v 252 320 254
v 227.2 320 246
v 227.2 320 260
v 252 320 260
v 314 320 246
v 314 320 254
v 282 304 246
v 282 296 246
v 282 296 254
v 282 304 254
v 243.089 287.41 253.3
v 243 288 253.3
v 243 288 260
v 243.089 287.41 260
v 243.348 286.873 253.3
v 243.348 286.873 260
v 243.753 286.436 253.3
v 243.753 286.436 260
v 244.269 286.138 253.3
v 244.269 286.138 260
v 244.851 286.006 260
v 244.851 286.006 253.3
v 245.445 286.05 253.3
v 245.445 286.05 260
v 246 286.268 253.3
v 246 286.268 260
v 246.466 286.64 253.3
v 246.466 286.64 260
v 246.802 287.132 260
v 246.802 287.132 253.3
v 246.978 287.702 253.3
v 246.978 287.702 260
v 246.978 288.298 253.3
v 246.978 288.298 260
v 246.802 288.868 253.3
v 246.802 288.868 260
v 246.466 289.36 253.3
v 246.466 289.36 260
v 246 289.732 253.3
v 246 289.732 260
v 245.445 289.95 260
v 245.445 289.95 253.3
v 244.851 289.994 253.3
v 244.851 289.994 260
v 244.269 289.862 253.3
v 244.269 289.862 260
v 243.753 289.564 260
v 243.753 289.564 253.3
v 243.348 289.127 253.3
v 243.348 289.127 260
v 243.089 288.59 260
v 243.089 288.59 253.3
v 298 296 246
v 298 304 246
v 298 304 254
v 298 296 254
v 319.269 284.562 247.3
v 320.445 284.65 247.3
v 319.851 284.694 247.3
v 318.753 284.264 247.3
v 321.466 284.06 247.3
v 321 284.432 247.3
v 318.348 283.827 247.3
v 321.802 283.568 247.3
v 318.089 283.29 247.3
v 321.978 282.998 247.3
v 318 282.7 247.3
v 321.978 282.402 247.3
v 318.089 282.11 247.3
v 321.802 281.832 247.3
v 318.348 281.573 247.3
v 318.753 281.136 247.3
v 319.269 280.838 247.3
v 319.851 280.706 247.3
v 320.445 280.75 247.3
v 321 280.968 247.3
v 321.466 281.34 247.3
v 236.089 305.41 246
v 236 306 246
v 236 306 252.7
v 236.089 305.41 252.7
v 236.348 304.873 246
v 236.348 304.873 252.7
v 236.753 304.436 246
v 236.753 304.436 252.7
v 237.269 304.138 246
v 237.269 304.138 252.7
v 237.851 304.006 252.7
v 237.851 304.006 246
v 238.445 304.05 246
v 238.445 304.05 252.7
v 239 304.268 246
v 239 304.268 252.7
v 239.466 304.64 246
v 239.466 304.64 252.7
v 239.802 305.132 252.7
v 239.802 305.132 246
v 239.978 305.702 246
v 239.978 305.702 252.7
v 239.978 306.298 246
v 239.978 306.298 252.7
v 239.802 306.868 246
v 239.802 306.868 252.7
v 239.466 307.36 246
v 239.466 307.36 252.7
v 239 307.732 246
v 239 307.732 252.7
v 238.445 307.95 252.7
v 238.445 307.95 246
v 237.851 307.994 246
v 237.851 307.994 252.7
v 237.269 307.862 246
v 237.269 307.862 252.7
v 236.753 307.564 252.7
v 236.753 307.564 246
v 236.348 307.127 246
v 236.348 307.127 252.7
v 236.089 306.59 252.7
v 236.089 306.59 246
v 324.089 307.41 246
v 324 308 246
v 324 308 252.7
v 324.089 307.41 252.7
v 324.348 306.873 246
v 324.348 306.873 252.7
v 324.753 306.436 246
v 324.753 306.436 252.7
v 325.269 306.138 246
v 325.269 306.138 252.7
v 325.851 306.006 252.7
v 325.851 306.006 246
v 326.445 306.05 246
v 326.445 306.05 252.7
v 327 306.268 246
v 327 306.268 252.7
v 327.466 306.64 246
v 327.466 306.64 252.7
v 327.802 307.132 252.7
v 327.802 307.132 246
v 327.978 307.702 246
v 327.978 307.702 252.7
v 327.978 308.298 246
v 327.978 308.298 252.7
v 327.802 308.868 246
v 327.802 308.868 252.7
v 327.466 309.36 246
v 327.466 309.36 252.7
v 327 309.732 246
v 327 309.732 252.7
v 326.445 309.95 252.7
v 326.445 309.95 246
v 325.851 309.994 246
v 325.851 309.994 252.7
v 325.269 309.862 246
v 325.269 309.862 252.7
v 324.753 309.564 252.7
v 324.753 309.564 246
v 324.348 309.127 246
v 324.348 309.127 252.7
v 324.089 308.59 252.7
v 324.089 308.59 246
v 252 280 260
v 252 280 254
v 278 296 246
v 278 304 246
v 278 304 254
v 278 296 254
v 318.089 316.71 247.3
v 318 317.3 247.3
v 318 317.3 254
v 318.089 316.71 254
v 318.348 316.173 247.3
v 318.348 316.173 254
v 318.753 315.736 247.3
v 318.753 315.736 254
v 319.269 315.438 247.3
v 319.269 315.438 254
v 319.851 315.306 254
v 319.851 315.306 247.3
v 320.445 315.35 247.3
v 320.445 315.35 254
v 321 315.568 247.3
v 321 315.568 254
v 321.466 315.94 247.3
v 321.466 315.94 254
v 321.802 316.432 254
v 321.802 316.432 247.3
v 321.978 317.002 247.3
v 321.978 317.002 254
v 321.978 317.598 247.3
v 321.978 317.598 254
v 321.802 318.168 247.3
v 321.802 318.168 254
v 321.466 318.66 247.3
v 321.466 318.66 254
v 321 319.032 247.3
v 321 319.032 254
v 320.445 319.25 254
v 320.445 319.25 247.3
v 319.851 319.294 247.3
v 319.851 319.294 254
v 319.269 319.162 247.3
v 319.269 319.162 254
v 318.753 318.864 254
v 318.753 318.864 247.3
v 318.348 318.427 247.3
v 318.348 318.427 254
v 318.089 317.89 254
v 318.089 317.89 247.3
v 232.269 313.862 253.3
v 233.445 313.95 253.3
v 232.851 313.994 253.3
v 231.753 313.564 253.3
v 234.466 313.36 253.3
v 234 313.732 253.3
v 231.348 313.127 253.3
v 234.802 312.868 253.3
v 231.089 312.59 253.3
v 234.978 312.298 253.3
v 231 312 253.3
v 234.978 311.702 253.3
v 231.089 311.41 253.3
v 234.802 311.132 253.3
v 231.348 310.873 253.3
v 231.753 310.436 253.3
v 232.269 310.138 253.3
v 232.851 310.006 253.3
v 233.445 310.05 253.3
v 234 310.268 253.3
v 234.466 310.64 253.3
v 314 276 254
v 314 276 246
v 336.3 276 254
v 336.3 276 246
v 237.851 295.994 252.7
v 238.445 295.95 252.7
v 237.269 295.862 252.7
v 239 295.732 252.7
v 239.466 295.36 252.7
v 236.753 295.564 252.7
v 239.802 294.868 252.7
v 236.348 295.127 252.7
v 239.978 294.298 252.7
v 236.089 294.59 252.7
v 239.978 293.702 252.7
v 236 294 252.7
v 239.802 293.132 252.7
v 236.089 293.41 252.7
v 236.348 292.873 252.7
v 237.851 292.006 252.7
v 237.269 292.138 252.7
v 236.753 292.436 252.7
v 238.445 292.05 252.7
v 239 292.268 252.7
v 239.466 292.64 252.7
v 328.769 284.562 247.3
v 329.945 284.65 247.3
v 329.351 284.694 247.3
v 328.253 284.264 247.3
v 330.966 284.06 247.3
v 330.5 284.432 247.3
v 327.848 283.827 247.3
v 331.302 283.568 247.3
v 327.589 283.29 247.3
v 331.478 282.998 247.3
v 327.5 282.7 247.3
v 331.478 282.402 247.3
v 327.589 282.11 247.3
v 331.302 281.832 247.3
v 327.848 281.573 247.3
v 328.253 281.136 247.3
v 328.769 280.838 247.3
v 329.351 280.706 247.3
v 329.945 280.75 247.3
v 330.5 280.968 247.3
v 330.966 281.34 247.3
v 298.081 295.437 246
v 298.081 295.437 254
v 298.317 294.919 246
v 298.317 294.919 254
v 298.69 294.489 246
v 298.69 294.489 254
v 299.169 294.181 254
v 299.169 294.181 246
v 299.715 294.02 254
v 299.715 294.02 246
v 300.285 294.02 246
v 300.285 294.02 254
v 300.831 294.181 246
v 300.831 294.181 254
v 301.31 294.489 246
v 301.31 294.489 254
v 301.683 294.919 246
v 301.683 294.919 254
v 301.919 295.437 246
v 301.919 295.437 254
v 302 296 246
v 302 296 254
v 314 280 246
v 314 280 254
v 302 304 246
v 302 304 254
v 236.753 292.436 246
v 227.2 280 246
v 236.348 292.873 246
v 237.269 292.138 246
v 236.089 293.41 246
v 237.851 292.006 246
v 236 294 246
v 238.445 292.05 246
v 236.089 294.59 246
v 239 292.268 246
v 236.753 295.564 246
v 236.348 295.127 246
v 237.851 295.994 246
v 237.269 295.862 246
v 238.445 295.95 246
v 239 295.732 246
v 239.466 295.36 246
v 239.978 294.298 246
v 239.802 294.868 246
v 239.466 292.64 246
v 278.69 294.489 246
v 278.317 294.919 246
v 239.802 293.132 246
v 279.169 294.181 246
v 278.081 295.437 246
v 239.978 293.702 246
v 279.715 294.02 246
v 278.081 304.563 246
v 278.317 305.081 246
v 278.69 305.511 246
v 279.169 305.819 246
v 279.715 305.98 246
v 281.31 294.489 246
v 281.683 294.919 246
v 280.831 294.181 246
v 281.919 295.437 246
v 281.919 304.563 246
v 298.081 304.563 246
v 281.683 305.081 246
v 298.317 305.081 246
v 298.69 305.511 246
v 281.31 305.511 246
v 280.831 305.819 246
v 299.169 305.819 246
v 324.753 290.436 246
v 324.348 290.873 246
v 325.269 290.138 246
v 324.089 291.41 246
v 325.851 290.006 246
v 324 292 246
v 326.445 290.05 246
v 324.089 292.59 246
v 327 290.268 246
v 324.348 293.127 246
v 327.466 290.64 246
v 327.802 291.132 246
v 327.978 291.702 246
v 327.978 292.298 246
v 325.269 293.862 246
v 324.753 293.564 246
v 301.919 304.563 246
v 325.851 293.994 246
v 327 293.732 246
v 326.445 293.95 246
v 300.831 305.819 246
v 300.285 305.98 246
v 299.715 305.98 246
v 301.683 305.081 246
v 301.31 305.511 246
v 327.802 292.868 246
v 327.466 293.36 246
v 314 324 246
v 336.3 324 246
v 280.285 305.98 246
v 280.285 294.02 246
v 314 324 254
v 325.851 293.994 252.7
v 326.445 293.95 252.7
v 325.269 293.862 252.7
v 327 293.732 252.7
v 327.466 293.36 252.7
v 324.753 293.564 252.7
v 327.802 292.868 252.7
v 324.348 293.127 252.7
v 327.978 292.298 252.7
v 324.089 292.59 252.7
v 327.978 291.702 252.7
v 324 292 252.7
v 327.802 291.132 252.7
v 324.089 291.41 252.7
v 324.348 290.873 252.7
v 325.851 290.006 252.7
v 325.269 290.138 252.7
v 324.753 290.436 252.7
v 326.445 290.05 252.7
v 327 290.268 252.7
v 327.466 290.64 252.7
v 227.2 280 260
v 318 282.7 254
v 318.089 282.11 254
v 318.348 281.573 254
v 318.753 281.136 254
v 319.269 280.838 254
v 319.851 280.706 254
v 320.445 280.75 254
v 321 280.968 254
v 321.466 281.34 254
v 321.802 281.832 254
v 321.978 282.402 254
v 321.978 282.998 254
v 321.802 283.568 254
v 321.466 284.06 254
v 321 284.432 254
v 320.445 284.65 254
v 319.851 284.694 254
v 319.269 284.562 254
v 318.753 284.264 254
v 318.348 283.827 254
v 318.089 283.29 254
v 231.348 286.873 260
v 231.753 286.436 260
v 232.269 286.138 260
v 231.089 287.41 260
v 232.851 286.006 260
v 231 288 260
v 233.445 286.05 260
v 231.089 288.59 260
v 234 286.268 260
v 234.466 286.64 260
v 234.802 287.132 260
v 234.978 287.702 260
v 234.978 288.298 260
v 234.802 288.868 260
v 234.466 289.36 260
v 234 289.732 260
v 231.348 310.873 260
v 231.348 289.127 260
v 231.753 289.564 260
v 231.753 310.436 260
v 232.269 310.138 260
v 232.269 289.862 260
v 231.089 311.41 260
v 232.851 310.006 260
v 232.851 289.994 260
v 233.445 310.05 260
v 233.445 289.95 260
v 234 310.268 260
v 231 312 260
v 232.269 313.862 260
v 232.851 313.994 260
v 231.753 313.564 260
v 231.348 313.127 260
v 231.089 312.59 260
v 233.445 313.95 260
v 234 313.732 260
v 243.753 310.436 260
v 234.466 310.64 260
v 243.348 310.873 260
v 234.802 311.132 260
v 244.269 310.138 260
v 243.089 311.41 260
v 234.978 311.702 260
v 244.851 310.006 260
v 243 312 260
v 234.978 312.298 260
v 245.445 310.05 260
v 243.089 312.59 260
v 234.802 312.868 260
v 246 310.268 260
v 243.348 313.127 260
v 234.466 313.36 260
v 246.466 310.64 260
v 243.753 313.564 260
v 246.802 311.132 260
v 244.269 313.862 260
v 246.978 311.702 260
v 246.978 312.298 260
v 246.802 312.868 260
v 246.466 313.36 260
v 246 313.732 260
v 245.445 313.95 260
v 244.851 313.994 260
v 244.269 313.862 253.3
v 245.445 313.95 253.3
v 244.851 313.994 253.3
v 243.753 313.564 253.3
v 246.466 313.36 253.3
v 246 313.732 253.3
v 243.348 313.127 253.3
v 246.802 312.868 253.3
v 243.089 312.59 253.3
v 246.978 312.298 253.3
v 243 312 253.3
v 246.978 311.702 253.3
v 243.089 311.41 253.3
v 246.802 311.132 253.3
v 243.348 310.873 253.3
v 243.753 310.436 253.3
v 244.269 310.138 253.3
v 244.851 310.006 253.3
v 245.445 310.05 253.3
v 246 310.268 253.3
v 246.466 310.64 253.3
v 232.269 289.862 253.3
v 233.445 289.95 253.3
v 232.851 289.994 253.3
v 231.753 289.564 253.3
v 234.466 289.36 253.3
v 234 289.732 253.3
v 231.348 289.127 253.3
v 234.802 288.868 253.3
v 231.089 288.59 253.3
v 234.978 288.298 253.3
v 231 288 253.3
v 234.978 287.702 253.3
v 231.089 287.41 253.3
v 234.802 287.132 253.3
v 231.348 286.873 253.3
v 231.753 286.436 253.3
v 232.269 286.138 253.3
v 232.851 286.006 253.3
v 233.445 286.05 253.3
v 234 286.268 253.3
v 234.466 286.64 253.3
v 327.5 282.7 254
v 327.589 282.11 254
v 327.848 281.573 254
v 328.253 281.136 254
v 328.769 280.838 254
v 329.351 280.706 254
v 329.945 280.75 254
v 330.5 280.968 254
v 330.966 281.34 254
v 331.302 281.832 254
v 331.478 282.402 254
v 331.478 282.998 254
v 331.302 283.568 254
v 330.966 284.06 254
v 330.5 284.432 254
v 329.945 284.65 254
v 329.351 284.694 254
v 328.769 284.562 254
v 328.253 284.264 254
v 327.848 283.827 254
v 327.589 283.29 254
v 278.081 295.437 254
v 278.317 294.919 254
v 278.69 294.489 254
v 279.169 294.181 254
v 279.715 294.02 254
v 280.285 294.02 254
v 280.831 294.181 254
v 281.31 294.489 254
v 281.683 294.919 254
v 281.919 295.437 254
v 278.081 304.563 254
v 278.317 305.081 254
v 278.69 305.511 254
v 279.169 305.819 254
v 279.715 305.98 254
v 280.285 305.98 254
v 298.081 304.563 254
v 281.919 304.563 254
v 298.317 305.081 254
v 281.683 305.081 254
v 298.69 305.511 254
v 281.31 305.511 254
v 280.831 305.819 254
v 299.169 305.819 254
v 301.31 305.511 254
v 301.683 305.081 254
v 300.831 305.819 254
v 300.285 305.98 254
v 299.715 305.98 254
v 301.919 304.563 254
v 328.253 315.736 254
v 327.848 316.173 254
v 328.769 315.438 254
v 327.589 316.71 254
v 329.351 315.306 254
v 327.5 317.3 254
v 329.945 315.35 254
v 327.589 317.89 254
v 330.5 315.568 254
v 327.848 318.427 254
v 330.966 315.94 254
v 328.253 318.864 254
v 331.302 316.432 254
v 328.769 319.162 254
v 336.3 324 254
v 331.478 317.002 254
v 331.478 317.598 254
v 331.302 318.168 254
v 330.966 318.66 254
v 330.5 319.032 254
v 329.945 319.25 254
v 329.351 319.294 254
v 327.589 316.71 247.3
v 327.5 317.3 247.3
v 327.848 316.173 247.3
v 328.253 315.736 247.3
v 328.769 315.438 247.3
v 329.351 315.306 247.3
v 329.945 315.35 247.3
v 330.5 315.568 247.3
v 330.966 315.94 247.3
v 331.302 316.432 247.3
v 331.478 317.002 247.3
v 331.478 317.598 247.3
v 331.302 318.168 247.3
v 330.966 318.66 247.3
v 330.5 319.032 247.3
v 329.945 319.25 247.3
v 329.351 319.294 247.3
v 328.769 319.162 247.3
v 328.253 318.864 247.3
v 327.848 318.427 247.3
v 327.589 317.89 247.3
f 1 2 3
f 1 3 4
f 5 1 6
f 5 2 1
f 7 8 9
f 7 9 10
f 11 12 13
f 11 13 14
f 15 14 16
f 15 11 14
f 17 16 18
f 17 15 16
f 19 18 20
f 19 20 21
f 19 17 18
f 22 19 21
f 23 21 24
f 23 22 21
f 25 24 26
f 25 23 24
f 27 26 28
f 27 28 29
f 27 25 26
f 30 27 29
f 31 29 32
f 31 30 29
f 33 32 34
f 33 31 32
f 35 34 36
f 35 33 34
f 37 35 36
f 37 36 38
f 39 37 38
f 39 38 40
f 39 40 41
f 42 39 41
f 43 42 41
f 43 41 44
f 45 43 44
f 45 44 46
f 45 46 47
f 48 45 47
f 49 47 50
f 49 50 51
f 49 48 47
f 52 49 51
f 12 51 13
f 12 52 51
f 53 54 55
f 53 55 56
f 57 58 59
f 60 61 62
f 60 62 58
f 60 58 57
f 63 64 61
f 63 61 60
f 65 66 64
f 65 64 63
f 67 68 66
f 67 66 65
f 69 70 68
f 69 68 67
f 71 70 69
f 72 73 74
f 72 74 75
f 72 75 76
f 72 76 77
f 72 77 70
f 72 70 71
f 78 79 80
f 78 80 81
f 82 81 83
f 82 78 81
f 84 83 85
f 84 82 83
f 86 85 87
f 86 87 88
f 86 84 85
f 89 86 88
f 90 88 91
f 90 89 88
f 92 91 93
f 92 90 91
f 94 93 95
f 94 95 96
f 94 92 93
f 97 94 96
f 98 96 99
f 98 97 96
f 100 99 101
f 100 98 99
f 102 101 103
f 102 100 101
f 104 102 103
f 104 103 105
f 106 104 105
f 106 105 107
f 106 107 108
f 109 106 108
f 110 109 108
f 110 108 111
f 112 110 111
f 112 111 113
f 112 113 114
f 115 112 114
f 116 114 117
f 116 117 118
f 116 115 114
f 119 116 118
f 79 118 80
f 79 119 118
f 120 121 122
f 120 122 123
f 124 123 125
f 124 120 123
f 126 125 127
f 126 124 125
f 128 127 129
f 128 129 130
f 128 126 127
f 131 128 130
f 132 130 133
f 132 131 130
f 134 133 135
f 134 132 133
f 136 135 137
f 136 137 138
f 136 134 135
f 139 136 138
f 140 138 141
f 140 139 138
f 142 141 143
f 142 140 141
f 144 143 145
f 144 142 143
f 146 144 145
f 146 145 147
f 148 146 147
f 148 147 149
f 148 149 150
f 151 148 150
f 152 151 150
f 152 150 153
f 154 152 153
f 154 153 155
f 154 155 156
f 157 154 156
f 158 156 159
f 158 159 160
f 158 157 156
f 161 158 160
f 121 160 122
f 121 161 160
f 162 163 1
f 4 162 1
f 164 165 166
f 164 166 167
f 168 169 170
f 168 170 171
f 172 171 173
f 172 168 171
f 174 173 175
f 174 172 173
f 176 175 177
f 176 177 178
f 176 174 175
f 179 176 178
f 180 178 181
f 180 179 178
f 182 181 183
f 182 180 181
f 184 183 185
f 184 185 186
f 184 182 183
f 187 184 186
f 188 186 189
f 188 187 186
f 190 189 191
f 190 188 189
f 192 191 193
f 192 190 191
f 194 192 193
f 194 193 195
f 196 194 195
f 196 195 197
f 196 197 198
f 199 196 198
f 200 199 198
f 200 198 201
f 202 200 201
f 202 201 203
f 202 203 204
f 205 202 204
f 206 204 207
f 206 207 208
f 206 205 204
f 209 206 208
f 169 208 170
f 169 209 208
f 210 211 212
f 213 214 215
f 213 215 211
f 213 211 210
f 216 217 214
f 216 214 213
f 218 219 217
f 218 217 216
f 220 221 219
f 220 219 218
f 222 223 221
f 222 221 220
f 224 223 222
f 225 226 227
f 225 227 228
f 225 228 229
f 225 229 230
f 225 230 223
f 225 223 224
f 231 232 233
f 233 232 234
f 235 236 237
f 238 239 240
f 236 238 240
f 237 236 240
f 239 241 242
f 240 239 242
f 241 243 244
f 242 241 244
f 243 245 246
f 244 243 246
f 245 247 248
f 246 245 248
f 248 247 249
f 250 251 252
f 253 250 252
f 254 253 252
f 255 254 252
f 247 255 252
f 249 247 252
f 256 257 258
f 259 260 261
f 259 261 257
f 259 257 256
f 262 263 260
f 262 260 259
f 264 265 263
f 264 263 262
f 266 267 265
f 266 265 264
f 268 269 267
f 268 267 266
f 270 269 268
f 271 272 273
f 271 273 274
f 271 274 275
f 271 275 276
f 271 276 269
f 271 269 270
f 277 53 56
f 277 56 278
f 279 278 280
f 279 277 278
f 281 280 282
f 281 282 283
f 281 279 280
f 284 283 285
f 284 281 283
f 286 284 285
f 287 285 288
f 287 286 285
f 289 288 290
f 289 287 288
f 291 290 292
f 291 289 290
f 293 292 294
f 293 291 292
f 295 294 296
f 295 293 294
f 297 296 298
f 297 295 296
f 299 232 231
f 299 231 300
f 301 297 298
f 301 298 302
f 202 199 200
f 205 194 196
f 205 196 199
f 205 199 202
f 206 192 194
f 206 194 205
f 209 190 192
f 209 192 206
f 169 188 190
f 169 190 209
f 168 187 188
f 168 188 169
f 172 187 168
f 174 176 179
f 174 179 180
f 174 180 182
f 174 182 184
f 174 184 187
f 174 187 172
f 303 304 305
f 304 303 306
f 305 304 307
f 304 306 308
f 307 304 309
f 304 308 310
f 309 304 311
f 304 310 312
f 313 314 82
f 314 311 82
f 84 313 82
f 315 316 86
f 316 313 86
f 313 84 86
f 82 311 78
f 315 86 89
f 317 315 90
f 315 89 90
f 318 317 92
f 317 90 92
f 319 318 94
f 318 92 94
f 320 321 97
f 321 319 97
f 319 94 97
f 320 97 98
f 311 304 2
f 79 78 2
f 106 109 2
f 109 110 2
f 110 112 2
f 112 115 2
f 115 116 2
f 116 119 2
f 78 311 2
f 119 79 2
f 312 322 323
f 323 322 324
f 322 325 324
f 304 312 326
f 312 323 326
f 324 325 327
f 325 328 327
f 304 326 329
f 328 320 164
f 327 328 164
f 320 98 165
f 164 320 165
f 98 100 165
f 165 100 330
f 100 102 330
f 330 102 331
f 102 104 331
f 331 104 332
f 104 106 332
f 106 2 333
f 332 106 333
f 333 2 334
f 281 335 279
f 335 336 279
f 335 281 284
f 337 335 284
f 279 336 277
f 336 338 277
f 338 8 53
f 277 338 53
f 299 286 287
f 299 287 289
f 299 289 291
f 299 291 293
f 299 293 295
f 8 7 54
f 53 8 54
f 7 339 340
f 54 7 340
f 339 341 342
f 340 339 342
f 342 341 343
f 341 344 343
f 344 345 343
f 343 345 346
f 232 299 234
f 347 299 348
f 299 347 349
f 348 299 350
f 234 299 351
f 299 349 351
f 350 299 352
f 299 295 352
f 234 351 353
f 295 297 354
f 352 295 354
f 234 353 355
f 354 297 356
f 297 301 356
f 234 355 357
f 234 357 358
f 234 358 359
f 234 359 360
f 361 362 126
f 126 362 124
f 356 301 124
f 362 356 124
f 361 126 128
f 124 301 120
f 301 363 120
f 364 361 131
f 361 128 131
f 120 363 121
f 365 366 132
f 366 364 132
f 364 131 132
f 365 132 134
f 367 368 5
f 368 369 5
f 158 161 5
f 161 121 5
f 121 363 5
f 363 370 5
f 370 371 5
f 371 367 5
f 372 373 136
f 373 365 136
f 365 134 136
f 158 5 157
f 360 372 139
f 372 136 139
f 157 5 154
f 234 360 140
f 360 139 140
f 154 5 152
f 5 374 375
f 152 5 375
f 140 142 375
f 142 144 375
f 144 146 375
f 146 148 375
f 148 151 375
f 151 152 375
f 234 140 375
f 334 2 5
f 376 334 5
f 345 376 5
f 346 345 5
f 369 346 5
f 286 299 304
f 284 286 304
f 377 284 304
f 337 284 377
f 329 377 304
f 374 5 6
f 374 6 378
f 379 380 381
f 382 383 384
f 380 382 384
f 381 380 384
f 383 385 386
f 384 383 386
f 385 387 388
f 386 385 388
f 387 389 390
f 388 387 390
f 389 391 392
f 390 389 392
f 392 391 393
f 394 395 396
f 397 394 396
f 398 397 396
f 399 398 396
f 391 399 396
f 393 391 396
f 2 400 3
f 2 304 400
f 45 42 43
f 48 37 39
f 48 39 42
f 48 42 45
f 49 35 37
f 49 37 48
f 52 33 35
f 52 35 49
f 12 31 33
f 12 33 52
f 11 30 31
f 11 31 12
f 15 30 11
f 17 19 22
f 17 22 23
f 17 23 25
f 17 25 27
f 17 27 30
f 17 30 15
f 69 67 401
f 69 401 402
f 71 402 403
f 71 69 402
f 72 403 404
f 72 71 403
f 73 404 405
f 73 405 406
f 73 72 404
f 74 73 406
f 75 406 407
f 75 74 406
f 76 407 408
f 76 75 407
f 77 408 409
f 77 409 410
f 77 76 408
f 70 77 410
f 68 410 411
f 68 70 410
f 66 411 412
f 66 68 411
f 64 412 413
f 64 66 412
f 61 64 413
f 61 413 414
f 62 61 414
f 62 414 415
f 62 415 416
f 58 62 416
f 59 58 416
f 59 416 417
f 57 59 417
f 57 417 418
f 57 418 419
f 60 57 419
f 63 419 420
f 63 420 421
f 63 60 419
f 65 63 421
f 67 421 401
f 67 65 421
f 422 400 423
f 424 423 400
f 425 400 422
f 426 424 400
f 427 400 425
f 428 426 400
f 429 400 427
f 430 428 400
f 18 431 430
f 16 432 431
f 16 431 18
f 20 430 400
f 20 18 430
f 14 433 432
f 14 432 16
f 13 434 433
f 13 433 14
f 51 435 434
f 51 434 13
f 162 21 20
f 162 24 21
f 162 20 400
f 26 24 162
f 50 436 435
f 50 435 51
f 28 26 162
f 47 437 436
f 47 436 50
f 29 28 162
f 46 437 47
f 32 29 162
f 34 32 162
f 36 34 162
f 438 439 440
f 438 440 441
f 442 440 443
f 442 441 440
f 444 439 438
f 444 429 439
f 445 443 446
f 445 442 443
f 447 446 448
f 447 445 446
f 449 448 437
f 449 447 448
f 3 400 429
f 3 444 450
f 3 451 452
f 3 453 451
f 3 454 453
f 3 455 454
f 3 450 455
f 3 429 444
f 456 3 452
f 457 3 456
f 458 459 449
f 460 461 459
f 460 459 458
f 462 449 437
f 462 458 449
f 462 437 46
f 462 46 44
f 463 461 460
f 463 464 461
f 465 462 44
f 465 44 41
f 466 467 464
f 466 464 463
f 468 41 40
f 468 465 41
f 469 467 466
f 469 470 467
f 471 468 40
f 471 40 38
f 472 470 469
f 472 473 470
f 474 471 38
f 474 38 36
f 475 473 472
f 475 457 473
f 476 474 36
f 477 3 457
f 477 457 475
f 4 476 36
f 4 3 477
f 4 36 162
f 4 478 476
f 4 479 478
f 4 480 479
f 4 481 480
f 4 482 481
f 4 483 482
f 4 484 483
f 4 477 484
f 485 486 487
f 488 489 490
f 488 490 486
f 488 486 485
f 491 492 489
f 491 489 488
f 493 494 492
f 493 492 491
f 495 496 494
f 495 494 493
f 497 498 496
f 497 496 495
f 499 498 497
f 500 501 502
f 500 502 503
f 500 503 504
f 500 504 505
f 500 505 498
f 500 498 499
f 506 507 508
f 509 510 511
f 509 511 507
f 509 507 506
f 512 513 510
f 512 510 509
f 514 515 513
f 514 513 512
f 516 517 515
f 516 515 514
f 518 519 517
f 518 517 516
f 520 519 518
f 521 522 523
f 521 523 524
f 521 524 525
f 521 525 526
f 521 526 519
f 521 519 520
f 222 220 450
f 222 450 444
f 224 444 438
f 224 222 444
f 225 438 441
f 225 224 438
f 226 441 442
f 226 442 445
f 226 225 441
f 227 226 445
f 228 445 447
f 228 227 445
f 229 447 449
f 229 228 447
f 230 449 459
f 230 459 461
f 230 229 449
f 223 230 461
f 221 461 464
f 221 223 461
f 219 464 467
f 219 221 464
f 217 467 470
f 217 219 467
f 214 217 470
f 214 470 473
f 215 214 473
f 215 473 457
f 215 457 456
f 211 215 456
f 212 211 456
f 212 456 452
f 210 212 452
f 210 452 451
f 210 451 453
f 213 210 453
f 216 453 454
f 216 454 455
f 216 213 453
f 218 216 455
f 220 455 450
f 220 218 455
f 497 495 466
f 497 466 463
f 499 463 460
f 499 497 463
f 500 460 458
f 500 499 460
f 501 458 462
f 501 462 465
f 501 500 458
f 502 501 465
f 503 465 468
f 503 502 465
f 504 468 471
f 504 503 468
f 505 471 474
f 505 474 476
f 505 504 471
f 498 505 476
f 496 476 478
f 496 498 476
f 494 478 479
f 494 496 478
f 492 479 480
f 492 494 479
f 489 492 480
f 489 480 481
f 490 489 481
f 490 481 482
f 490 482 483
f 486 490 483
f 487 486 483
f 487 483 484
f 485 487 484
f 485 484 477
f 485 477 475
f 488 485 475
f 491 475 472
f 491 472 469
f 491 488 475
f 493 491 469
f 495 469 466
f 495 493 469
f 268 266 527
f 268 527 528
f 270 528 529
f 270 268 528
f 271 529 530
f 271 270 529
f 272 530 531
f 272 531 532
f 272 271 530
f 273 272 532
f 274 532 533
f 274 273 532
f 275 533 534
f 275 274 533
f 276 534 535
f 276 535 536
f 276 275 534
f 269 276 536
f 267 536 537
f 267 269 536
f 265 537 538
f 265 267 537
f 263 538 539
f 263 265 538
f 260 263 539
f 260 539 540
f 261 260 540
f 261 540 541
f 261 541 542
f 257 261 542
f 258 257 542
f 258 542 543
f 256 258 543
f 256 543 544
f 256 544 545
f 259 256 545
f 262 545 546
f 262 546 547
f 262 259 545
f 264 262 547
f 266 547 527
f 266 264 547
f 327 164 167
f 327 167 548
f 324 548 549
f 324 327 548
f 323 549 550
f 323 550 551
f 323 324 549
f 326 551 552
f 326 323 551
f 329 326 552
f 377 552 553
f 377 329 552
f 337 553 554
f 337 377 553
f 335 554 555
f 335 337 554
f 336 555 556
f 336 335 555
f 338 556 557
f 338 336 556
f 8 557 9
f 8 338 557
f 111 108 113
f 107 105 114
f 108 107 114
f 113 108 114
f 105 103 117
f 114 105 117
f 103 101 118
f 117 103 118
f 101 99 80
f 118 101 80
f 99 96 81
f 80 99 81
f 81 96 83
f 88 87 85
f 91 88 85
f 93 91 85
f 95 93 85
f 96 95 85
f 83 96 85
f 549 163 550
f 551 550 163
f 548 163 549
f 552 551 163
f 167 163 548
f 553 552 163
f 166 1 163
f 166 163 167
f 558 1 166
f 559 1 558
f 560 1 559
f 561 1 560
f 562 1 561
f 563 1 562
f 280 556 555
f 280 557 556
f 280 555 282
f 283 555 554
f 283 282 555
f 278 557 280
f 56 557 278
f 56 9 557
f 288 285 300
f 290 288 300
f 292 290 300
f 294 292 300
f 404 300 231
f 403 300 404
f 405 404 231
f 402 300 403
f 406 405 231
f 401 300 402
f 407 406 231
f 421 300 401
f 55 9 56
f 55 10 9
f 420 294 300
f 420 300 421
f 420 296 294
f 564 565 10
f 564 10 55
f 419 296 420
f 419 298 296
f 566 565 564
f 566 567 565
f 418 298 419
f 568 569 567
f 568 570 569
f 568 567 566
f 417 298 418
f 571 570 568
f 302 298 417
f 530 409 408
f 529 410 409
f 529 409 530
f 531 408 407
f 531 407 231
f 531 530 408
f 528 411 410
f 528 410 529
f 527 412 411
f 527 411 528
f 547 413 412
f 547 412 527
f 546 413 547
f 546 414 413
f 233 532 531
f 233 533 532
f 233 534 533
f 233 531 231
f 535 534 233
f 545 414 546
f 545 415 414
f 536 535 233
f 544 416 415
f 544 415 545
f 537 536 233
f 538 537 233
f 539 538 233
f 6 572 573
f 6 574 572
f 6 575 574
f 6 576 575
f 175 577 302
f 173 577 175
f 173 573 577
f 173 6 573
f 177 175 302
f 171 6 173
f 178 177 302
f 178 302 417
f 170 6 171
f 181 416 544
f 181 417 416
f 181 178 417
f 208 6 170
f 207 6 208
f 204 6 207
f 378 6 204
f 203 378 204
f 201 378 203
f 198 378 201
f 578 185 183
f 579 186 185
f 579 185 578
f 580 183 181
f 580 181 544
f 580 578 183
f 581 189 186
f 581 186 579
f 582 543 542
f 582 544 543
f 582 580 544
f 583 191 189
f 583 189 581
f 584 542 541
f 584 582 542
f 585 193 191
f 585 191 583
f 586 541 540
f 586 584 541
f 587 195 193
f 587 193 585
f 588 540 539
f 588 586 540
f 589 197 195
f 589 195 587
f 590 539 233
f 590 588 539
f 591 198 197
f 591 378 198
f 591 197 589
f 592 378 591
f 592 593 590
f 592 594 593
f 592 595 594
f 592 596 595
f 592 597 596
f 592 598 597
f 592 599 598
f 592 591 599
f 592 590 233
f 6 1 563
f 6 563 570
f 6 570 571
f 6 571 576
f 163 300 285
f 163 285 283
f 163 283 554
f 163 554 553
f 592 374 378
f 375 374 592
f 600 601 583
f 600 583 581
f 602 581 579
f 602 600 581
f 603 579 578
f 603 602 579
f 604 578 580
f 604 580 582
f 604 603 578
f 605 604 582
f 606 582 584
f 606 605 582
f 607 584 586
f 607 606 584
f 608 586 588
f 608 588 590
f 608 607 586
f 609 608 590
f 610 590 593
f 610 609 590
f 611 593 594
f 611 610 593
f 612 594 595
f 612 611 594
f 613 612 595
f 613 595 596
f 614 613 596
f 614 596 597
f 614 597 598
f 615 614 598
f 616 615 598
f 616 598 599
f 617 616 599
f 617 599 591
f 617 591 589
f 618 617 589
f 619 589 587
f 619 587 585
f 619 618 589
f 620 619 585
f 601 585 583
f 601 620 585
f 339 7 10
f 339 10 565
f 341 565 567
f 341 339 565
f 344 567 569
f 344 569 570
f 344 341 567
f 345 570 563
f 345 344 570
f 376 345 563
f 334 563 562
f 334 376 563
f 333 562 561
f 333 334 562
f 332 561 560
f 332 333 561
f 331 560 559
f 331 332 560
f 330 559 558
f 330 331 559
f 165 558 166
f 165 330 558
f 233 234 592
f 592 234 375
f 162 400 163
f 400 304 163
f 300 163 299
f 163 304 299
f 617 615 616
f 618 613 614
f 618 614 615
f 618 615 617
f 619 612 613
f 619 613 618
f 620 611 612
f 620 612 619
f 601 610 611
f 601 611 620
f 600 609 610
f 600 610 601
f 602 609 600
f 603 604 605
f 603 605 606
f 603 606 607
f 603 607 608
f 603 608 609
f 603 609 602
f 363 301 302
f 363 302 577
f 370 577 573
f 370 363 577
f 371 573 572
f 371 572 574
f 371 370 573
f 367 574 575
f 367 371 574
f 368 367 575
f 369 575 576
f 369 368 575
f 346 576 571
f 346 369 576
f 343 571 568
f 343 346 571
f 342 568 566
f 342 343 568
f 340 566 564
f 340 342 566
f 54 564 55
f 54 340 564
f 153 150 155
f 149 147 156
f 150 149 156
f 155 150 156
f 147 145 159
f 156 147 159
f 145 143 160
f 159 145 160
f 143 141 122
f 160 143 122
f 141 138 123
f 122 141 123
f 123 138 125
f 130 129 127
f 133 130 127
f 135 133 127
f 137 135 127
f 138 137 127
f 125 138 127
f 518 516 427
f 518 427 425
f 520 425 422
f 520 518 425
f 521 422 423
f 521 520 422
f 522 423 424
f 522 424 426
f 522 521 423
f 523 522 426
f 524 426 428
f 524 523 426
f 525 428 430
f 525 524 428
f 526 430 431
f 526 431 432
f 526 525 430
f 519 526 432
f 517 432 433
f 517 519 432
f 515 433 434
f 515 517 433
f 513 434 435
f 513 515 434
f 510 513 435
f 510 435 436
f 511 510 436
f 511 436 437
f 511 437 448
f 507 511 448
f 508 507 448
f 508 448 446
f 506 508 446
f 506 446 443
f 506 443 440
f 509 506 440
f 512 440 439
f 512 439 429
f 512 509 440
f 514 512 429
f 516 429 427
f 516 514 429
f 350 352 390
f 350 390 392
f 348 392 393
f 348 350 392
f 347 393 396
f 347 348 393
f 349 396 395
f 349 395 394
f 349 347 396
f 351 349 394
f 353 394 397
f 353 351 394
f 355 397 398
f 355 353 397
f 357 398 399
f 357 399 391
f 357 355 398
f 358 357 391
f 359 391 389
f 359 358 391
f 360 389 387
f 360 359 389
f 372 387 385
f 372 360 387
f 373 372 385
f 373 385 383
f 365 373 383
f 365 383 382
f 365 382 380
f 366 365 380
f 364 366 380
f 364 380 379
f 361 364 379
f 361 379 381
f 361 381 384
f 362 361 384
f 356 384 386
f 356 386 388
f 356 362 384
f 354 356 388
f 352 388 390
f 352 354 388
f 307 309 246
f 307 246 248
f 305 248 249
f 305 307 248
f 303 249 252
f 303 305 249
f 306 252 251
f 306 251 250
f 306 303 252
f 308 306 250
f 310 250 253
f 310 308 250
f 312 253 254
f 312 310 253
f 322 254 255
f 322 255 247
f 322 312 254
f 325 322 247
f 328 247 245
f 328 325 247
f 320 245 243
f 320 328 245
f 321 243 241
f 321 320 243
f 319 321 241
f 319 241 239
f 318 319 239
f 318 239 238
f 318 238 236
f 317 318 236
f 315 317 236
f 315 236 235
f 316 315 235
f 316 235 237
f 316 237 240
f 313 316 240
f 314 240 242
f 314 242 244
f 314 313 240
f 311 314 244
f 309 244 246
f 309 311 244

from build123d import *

# Parameters (mm, degrees)
SKETCH1_W           = 109.1
SKETCH1_H           = 40
BOSS_EXTRUDE1_DEPTH = 8
SKETCH2_W           = 22.3
SKETCH2_H           = 48
BOSS_EXTRUDE2_DEPTH = 8
SKETCH3_W           = 24.8
SKETCH3_H           = 40
BOSS_EXTRUDE3_DEPTH = 6
SKETCH4_R           = 2
CUT_EXTRUDE1_DEPTH  = 6.7
SKETCH5_R           = 2
CUT_EXTRUDE2_DEPTH  = 6.7
SKETCH6_R           = 2
CUT_EXTRUDE3_DEPTH  = 6.7


with BuildPart() as part:
    # Sketch1 → Boss-Extrude1 (new body)
    with BuildSketch(Plane.XY.offset(246)):
        with Locations((281.75, 300)):
            Rectangle(SKETCH1_W, SKETCH1_H)
        with BuildLine():
            Line((282, 296), (282, 304))
            ThreePointArc((282, 304), (280, 306), (278, 304))
            Line((278, 304), (278, 296))
            ThreePointArc((278, 296), (280, 294), (282, 296))
        make_face(mode=Mode.SUBTRACT)
        with BuildLine():
            Line((302, 296), (302, 304))
            ThreePointArc((302, 304), (300, 306), (298, 304))
            Line((298, 304), (298, 296))
            ThreePointArc((298, 296), (300, 294), (302, 296))
        make_face(mode=Mode.SUBTRACT)
    extrude(amount=BOSS_EXTRUDE1_DEPTH)

    # Sketch2 → Boss-Extrude2 (add)
    with BuildSketch(Plane.XY.offset(246)):
        with Locations((325.15, 300)):
            Rectangle(SKETCH2_W, SKETCH2_H)
    extrude(amount=BOSS_EXTRUDE2_DEPTH)

    # Sketch3 → Boss-Extrude3 (add)
    with BuildSketch(Plane.XY.offset(254)):
        with Locations((239.6, 300)):
            Rectangle(SKETCH3_W, SKETCH3_H)
    extrude(amount=BOSS_EXTRUDE3_DEPTH)

    # Sketch4 → Cut-Extrude1 (cut)
    with BuildSketch(Plane.XY.offset(253.3)):
        with Locations((233, 288)):
            Circle(SKETCH4_R)
        with Locations((233, 312)):
            Circle(SKETCH4_R)
        with Locations((245, 288)):
            Circle(SKETCH4_R)
        with Locations((245, 312)):
            Circle(SKETCH4_R)
    extrude(amount=CUT_EXTRUDE1_DEPTH, mode=Mode.SUBTRACT)

    # Sketch5 → Cut-Extrude2 (cut)
    with BuildSketch(Plane.XY.offset(247.3)):
        with Locations((320, 282.7)):
            Circle(SKETCH5_R)
        with Locations((320, 317.3)):
            Circle(SKETCH5_R)
        with Locations((329.5, 282.7)):
            Circle(SKETCH5_R)
        with Locations((329.5, 317.3)):
            Circle(SKETCH5_R)
    extrude(amount=CUT_EXTRUDE2_DEPTH, mode=Mode.SUBTRACT)

    # Sketch6 → Cut-Extrude3 (cut)
    with BuildSketch(Plane.XY.offset(246)):
        with Locations((238, 294)):
            Circle(SKETCH6_R)
        with Locations((238, 306)):
            Circle(SKETCH6_R)
        with Locations((326, 292)):
            Circle(SKETCH6_R)
        with Locations((326, 308)):
            Circle(SKETCH6_R)
    extrude(amount=CUT_EXTRUDE3_DEPTH, mode=Mode.SUBTRACT)


solid = part.part
